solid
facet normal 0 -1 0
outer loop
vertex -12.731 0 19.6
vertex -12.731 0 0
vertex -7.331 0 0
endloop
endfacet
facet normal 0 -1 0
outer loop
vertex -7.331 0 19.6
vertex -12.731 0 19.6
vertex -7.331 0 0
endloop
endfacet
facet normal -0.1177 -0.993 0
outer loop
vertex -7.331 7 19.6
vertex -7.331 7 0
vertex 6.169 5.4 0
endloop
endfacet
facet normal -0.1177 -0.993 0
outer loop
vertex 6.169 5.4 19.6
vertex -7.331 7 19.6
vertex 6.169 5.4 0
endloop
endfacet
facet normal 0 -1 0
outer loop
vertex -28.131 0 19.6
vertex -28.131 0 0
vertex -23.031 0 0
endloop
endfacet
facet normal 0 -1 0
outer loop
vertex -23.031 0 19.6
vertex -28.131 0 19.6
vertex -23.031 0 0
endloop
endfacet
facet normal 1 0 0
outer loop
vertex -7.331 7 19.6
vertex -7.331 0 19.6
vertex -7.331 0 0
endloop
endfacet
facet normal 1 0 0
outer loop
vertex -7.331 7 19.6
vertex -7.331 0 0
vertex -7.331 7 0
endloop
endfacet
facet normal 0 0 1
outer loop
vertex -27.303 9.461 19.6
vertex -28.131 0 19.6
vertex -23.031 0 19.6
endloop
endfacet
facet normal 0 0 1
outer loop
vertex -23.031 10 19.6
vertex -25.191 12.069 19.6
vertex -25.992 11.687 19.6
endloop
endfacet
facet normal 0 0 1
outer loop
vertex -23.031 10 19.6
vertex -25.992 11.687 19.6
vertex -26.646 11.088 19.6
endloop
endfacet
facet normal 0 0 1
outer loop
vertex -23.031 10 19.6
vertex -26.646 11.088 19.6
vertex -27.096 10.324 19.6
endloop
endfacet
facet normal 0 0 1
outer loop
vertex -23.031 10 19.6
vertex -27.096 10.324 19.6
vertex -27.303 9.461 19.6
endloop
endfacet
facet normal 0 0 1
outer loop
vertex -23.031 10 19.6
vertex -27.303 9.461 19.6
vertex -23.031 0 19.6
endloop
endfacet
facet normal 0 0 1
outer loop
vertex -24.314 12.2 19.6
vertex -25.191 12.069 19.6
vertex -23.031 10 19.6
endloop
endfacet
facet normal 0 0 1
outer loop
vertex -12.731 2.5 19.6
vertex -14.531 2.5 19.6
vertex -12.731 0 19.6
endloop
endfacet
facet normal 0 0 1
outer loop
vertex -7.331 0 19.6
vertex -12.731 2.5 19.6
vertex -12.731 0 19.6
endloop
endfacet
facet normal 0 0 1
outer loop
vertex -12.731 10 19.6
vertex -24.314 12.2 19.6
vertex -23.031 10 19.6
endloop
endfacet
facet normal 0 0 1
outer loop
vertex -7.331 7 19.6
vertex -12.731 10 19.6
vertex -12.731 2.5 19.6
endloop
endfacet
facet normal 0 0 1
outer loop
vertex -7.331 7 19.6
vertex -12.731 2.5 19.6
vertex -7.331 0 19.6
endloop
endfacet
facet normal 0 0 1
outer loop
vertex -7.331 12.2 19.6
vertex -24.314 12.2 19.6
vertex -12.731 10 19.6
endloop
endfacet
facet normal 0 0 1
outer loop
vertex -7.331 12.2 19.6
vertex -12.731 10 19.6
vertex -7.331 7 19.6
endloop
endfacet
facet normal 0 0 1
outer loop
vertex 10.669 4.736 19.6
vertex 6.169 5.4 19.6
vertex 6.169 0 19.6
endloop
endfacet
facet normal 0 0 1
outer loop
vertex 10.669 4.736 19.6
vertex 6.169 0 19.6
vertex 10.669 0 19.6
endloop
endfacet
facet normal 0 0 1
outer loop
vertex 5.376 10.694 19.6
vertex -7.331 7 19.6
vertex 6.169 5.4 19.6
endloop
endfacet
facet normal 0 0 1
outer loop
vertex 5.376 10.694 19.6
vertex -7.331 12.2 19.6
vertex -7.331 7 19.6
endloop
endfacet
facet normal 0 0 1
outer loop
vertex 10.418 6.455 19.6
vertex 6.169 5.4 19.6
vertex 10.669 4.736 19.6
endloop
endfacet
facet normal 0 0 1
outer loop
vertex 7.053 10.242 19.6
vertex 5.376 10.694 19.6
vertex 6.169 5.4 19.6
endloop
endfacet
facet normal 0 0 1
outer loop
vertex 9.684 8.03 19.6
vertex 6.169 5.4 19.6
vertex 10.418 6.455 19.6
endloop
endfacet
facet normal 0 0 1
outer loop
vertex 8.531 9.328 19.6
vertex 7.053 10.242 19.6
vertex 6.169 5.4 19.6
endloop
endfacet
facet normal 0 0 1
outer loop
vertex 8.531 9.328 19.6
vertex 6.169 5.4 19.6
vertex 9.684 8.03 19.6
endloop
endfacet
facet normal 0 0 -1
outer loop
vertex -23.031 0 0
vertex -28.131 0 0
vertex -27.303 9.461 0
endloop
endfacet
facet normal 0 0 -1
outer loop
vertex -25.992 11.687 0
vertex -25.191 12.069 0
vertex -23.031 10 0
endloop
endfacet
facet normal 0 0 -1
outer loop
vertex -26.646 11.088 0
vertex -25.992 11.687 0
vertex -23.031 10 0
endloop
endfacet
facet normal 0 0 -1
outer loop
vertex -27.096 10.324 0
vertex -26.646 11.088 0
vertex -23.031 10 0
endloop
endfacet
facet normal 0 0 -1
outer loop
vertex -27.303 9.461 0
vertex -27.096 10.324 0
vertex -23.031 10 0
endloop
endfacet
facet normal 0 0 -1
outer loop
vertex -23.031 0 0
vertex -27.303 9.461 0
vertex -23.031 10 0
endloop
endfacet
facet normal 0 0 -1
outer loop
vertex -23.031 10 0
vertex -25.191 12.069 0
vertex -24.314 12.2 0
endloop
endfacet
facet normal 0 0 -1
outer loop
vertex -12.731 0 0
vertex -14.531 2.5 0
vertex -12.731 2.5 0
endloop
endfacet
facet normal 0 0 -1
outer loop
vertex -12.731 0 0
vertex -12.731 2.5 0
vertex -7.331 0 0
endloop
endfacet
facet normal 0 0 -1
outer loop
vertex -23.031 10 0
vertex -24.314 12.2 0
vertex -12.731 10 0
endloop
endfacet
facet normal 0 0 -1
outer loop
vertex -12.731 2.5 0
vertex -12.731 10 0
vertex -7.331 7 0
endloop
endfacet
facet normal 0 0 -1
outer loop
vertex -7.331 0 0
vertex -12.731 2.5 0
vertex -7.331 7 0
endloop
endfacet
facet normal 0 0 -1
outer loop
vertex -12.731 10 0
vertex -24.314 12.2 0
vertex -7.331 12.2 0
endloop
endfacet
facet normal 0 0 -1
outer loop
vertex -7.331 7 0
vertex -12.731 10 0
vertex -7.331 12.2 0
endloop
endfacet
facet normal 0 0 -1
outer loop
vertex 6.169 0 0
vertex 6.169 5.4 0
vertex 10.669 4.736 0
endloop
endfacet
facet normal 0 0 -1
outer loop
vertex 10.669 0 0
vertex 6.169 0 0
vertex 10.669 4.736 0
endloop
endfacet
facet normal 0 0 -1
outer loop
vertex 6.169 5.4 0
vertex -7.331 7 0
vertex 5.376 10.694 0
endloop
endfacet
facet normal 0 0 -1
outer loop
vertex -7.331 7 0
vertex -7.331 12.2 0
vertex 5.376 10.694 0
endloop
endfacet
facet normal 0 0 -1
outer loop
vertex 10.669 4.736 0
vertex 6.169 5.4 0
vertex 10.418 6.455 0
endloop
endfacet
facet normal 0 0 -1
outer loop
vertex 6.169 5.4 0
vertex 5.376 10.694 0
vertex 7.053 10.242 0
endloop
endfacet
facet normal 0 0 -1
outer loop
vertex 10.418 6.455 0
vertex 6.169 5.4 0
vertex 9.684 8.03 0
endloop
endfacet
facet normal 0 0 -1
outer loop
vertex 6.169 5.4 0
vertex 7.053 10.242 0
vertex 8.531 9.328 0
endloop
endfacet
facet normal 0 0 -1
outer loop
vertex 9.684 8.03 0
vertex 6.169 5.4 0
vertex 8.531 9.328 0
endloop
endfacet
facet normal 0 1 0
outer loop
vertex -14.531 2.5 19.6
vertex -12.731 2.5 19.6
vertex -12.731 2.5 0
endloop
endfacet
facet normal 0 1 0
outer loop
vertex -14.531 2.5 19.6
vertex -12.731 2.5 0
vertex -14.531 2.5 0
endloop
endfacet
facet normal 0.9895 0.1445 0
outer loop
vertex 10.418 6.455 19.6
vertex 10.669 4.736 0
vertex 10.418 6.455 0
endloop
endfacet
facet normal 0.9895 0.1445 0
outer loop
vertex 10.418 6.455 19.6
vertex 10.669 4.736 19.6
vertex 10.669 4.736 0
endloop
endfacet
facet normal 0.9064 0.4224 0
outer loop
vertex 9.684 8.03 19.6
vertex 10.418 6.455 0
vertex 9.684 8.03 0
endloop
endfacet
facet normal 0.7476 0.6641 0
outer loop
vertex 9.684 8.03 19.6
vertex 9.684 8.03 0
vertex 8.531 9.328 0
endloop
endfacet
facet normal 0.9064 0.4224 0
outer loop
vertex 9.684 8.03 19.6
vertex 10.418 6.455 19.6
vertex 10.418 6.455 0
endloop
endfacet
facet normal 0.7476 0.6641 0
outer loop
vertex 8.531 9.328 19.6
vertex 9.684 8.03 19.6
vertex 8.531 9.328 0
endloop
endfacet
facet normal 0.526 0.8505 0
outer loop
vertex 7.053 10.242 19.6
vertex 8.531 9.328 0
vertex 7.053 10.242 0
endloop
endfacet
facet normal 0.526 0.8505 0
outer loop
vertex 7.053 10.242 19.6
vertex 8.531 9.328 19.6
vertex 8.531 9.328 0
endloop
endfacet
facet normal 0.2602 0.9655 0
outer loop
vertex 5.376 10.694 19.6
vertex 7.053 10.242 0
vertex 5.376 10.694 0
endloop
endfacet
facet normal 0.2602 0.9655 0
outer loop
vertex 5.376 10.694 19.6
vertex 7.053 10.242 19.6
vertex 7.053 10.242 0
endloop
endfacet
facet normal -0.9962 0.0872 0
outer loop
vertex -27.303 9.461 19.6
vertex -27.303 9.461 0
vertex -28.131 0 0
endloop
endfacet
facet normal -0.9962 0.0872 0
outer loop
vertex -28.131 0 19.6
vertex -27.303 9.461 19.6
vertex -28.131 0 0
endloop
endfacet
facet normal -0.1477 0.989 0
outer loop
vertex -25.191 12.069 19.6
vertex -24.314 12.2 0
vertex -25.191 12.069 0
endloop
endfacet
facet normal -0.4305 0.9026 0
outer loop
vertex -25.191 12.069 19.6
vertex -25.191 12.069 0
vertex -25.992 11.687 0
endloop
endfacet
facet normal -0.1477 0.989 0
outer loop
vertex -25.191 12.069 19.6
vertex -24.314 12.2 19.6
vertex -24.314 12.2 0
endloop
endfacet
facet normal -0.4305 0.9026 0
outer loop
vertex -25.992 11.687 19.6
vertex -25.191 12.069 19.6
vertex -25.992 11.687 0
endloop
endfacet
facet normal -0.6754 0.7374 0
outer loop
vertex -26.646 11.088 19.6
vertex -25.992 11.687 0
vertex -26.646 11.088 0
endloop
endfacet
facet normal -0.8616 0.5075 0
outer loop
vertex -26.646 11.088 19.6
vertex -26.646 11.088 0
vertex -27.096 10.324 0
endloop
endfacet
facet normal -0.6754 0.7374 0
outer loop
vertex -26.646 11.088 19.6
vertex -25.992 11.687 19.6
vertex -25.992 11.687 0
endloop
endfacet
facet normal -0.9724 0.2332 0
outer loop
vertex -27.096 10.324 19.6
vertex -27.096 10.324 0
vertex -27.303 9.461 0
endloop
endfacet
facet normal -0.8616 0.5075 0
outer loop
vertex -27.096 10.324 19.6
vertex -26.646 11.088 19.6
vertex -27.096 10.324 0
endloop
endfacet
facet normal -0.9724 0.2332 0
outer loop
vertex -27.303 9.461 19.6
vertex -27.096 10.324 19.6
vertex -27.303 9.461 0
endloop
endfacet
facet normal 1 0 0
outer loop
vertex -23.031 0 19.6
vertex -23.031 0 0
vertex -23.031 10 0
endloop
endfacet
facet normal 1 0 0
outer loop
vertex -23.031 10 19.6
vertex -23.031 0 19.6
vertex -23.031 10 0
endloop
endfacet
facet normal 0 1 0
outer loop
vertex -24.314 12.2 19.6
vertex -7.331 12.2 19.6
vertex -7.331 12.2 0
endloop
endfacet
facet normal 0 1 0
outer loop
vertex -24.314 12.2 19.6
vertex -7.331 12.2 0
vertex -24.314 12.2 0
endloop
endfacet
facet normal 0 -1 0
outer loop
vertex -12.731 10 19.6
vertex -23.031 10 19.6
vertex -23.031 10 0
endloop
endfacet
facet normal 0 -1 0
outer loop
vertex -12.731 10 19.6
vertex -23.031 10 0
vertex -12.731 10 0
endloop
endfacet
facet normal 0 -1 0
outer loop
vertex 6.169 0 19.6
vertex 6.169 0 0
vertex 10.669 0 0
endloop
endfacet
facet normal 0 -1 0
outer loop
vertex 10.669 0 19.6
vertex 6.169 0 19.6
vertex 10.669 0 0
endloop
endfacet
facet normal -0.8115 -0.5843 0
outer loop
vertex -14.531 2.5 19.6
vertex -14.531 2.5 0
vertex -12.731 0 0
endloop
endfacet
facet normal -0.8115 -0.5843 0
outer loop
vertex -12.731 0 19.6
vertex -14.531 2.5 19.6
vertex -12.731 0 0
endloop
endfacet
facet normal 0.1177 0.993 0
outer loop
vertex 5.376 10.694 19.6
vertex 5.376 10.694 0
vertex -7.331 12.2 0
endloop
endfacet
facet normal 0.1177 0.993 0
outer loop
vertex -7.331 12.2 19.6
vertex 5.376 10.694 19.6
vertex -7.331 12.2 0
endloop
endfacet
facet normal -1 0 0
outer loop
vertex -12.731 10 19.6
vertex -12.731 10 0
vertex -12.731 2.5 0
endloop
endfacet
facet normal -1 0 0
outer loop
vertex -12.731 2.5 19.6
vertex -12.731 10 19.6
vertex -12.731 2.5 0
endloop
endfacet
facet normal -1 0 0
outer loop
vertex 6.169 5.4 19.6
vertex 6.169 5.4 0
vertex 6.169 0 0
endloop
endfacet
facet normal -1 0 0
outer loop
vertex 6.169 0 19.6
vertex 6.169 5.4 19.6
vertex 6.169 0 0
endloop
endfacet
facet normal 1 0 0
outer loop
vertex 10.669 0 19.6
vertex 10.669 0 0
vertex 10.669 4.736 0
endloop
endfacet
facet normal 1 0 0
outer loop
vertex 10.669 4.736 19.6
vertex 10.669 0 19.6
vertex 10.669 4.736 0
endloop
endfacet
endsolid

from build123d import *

# Parameters (mm, degrees)
F1_DEPTH = 19.6
F2_R     = 6
F3_R     = 3


with BuildPart() as f1:
    # F0 (on Top) → F1 (new body)
    with BuildSketch(Plane.XY):
        Polygon((-28.130636, 0), (-23.030636, 0), (-23.030636, 10), (-12.730636, 10), (-12.730636, 2.5), (-14.530636, 2.5), (-12.730636, 0), (-7.330636, 0), (-7.330636, 7), (6.169364, 5.4), (6.169364, 0), (10.669364, 0), (10.669364, 10.066667), (-7.330636, 12.2), (-27.063274, 12.2), align=None)
    extrude(amount=F1_DEPTH)

    # F2
    f2_edges = [f1.edges().sort_by_distance(p)[0] for p in [
        (10.669364, 10.066667, 9.8),
    ]]
    fillet(f2_edges, radius=F2_R)

    # F3
    f3_edges = [f1.edges().sort_by_distance(p)[0] for p in [
        (-27.063274, 12.2, 9.8),
    ]]
    fillet(f3_edges, radius=F3_R)


solid = f1.part
